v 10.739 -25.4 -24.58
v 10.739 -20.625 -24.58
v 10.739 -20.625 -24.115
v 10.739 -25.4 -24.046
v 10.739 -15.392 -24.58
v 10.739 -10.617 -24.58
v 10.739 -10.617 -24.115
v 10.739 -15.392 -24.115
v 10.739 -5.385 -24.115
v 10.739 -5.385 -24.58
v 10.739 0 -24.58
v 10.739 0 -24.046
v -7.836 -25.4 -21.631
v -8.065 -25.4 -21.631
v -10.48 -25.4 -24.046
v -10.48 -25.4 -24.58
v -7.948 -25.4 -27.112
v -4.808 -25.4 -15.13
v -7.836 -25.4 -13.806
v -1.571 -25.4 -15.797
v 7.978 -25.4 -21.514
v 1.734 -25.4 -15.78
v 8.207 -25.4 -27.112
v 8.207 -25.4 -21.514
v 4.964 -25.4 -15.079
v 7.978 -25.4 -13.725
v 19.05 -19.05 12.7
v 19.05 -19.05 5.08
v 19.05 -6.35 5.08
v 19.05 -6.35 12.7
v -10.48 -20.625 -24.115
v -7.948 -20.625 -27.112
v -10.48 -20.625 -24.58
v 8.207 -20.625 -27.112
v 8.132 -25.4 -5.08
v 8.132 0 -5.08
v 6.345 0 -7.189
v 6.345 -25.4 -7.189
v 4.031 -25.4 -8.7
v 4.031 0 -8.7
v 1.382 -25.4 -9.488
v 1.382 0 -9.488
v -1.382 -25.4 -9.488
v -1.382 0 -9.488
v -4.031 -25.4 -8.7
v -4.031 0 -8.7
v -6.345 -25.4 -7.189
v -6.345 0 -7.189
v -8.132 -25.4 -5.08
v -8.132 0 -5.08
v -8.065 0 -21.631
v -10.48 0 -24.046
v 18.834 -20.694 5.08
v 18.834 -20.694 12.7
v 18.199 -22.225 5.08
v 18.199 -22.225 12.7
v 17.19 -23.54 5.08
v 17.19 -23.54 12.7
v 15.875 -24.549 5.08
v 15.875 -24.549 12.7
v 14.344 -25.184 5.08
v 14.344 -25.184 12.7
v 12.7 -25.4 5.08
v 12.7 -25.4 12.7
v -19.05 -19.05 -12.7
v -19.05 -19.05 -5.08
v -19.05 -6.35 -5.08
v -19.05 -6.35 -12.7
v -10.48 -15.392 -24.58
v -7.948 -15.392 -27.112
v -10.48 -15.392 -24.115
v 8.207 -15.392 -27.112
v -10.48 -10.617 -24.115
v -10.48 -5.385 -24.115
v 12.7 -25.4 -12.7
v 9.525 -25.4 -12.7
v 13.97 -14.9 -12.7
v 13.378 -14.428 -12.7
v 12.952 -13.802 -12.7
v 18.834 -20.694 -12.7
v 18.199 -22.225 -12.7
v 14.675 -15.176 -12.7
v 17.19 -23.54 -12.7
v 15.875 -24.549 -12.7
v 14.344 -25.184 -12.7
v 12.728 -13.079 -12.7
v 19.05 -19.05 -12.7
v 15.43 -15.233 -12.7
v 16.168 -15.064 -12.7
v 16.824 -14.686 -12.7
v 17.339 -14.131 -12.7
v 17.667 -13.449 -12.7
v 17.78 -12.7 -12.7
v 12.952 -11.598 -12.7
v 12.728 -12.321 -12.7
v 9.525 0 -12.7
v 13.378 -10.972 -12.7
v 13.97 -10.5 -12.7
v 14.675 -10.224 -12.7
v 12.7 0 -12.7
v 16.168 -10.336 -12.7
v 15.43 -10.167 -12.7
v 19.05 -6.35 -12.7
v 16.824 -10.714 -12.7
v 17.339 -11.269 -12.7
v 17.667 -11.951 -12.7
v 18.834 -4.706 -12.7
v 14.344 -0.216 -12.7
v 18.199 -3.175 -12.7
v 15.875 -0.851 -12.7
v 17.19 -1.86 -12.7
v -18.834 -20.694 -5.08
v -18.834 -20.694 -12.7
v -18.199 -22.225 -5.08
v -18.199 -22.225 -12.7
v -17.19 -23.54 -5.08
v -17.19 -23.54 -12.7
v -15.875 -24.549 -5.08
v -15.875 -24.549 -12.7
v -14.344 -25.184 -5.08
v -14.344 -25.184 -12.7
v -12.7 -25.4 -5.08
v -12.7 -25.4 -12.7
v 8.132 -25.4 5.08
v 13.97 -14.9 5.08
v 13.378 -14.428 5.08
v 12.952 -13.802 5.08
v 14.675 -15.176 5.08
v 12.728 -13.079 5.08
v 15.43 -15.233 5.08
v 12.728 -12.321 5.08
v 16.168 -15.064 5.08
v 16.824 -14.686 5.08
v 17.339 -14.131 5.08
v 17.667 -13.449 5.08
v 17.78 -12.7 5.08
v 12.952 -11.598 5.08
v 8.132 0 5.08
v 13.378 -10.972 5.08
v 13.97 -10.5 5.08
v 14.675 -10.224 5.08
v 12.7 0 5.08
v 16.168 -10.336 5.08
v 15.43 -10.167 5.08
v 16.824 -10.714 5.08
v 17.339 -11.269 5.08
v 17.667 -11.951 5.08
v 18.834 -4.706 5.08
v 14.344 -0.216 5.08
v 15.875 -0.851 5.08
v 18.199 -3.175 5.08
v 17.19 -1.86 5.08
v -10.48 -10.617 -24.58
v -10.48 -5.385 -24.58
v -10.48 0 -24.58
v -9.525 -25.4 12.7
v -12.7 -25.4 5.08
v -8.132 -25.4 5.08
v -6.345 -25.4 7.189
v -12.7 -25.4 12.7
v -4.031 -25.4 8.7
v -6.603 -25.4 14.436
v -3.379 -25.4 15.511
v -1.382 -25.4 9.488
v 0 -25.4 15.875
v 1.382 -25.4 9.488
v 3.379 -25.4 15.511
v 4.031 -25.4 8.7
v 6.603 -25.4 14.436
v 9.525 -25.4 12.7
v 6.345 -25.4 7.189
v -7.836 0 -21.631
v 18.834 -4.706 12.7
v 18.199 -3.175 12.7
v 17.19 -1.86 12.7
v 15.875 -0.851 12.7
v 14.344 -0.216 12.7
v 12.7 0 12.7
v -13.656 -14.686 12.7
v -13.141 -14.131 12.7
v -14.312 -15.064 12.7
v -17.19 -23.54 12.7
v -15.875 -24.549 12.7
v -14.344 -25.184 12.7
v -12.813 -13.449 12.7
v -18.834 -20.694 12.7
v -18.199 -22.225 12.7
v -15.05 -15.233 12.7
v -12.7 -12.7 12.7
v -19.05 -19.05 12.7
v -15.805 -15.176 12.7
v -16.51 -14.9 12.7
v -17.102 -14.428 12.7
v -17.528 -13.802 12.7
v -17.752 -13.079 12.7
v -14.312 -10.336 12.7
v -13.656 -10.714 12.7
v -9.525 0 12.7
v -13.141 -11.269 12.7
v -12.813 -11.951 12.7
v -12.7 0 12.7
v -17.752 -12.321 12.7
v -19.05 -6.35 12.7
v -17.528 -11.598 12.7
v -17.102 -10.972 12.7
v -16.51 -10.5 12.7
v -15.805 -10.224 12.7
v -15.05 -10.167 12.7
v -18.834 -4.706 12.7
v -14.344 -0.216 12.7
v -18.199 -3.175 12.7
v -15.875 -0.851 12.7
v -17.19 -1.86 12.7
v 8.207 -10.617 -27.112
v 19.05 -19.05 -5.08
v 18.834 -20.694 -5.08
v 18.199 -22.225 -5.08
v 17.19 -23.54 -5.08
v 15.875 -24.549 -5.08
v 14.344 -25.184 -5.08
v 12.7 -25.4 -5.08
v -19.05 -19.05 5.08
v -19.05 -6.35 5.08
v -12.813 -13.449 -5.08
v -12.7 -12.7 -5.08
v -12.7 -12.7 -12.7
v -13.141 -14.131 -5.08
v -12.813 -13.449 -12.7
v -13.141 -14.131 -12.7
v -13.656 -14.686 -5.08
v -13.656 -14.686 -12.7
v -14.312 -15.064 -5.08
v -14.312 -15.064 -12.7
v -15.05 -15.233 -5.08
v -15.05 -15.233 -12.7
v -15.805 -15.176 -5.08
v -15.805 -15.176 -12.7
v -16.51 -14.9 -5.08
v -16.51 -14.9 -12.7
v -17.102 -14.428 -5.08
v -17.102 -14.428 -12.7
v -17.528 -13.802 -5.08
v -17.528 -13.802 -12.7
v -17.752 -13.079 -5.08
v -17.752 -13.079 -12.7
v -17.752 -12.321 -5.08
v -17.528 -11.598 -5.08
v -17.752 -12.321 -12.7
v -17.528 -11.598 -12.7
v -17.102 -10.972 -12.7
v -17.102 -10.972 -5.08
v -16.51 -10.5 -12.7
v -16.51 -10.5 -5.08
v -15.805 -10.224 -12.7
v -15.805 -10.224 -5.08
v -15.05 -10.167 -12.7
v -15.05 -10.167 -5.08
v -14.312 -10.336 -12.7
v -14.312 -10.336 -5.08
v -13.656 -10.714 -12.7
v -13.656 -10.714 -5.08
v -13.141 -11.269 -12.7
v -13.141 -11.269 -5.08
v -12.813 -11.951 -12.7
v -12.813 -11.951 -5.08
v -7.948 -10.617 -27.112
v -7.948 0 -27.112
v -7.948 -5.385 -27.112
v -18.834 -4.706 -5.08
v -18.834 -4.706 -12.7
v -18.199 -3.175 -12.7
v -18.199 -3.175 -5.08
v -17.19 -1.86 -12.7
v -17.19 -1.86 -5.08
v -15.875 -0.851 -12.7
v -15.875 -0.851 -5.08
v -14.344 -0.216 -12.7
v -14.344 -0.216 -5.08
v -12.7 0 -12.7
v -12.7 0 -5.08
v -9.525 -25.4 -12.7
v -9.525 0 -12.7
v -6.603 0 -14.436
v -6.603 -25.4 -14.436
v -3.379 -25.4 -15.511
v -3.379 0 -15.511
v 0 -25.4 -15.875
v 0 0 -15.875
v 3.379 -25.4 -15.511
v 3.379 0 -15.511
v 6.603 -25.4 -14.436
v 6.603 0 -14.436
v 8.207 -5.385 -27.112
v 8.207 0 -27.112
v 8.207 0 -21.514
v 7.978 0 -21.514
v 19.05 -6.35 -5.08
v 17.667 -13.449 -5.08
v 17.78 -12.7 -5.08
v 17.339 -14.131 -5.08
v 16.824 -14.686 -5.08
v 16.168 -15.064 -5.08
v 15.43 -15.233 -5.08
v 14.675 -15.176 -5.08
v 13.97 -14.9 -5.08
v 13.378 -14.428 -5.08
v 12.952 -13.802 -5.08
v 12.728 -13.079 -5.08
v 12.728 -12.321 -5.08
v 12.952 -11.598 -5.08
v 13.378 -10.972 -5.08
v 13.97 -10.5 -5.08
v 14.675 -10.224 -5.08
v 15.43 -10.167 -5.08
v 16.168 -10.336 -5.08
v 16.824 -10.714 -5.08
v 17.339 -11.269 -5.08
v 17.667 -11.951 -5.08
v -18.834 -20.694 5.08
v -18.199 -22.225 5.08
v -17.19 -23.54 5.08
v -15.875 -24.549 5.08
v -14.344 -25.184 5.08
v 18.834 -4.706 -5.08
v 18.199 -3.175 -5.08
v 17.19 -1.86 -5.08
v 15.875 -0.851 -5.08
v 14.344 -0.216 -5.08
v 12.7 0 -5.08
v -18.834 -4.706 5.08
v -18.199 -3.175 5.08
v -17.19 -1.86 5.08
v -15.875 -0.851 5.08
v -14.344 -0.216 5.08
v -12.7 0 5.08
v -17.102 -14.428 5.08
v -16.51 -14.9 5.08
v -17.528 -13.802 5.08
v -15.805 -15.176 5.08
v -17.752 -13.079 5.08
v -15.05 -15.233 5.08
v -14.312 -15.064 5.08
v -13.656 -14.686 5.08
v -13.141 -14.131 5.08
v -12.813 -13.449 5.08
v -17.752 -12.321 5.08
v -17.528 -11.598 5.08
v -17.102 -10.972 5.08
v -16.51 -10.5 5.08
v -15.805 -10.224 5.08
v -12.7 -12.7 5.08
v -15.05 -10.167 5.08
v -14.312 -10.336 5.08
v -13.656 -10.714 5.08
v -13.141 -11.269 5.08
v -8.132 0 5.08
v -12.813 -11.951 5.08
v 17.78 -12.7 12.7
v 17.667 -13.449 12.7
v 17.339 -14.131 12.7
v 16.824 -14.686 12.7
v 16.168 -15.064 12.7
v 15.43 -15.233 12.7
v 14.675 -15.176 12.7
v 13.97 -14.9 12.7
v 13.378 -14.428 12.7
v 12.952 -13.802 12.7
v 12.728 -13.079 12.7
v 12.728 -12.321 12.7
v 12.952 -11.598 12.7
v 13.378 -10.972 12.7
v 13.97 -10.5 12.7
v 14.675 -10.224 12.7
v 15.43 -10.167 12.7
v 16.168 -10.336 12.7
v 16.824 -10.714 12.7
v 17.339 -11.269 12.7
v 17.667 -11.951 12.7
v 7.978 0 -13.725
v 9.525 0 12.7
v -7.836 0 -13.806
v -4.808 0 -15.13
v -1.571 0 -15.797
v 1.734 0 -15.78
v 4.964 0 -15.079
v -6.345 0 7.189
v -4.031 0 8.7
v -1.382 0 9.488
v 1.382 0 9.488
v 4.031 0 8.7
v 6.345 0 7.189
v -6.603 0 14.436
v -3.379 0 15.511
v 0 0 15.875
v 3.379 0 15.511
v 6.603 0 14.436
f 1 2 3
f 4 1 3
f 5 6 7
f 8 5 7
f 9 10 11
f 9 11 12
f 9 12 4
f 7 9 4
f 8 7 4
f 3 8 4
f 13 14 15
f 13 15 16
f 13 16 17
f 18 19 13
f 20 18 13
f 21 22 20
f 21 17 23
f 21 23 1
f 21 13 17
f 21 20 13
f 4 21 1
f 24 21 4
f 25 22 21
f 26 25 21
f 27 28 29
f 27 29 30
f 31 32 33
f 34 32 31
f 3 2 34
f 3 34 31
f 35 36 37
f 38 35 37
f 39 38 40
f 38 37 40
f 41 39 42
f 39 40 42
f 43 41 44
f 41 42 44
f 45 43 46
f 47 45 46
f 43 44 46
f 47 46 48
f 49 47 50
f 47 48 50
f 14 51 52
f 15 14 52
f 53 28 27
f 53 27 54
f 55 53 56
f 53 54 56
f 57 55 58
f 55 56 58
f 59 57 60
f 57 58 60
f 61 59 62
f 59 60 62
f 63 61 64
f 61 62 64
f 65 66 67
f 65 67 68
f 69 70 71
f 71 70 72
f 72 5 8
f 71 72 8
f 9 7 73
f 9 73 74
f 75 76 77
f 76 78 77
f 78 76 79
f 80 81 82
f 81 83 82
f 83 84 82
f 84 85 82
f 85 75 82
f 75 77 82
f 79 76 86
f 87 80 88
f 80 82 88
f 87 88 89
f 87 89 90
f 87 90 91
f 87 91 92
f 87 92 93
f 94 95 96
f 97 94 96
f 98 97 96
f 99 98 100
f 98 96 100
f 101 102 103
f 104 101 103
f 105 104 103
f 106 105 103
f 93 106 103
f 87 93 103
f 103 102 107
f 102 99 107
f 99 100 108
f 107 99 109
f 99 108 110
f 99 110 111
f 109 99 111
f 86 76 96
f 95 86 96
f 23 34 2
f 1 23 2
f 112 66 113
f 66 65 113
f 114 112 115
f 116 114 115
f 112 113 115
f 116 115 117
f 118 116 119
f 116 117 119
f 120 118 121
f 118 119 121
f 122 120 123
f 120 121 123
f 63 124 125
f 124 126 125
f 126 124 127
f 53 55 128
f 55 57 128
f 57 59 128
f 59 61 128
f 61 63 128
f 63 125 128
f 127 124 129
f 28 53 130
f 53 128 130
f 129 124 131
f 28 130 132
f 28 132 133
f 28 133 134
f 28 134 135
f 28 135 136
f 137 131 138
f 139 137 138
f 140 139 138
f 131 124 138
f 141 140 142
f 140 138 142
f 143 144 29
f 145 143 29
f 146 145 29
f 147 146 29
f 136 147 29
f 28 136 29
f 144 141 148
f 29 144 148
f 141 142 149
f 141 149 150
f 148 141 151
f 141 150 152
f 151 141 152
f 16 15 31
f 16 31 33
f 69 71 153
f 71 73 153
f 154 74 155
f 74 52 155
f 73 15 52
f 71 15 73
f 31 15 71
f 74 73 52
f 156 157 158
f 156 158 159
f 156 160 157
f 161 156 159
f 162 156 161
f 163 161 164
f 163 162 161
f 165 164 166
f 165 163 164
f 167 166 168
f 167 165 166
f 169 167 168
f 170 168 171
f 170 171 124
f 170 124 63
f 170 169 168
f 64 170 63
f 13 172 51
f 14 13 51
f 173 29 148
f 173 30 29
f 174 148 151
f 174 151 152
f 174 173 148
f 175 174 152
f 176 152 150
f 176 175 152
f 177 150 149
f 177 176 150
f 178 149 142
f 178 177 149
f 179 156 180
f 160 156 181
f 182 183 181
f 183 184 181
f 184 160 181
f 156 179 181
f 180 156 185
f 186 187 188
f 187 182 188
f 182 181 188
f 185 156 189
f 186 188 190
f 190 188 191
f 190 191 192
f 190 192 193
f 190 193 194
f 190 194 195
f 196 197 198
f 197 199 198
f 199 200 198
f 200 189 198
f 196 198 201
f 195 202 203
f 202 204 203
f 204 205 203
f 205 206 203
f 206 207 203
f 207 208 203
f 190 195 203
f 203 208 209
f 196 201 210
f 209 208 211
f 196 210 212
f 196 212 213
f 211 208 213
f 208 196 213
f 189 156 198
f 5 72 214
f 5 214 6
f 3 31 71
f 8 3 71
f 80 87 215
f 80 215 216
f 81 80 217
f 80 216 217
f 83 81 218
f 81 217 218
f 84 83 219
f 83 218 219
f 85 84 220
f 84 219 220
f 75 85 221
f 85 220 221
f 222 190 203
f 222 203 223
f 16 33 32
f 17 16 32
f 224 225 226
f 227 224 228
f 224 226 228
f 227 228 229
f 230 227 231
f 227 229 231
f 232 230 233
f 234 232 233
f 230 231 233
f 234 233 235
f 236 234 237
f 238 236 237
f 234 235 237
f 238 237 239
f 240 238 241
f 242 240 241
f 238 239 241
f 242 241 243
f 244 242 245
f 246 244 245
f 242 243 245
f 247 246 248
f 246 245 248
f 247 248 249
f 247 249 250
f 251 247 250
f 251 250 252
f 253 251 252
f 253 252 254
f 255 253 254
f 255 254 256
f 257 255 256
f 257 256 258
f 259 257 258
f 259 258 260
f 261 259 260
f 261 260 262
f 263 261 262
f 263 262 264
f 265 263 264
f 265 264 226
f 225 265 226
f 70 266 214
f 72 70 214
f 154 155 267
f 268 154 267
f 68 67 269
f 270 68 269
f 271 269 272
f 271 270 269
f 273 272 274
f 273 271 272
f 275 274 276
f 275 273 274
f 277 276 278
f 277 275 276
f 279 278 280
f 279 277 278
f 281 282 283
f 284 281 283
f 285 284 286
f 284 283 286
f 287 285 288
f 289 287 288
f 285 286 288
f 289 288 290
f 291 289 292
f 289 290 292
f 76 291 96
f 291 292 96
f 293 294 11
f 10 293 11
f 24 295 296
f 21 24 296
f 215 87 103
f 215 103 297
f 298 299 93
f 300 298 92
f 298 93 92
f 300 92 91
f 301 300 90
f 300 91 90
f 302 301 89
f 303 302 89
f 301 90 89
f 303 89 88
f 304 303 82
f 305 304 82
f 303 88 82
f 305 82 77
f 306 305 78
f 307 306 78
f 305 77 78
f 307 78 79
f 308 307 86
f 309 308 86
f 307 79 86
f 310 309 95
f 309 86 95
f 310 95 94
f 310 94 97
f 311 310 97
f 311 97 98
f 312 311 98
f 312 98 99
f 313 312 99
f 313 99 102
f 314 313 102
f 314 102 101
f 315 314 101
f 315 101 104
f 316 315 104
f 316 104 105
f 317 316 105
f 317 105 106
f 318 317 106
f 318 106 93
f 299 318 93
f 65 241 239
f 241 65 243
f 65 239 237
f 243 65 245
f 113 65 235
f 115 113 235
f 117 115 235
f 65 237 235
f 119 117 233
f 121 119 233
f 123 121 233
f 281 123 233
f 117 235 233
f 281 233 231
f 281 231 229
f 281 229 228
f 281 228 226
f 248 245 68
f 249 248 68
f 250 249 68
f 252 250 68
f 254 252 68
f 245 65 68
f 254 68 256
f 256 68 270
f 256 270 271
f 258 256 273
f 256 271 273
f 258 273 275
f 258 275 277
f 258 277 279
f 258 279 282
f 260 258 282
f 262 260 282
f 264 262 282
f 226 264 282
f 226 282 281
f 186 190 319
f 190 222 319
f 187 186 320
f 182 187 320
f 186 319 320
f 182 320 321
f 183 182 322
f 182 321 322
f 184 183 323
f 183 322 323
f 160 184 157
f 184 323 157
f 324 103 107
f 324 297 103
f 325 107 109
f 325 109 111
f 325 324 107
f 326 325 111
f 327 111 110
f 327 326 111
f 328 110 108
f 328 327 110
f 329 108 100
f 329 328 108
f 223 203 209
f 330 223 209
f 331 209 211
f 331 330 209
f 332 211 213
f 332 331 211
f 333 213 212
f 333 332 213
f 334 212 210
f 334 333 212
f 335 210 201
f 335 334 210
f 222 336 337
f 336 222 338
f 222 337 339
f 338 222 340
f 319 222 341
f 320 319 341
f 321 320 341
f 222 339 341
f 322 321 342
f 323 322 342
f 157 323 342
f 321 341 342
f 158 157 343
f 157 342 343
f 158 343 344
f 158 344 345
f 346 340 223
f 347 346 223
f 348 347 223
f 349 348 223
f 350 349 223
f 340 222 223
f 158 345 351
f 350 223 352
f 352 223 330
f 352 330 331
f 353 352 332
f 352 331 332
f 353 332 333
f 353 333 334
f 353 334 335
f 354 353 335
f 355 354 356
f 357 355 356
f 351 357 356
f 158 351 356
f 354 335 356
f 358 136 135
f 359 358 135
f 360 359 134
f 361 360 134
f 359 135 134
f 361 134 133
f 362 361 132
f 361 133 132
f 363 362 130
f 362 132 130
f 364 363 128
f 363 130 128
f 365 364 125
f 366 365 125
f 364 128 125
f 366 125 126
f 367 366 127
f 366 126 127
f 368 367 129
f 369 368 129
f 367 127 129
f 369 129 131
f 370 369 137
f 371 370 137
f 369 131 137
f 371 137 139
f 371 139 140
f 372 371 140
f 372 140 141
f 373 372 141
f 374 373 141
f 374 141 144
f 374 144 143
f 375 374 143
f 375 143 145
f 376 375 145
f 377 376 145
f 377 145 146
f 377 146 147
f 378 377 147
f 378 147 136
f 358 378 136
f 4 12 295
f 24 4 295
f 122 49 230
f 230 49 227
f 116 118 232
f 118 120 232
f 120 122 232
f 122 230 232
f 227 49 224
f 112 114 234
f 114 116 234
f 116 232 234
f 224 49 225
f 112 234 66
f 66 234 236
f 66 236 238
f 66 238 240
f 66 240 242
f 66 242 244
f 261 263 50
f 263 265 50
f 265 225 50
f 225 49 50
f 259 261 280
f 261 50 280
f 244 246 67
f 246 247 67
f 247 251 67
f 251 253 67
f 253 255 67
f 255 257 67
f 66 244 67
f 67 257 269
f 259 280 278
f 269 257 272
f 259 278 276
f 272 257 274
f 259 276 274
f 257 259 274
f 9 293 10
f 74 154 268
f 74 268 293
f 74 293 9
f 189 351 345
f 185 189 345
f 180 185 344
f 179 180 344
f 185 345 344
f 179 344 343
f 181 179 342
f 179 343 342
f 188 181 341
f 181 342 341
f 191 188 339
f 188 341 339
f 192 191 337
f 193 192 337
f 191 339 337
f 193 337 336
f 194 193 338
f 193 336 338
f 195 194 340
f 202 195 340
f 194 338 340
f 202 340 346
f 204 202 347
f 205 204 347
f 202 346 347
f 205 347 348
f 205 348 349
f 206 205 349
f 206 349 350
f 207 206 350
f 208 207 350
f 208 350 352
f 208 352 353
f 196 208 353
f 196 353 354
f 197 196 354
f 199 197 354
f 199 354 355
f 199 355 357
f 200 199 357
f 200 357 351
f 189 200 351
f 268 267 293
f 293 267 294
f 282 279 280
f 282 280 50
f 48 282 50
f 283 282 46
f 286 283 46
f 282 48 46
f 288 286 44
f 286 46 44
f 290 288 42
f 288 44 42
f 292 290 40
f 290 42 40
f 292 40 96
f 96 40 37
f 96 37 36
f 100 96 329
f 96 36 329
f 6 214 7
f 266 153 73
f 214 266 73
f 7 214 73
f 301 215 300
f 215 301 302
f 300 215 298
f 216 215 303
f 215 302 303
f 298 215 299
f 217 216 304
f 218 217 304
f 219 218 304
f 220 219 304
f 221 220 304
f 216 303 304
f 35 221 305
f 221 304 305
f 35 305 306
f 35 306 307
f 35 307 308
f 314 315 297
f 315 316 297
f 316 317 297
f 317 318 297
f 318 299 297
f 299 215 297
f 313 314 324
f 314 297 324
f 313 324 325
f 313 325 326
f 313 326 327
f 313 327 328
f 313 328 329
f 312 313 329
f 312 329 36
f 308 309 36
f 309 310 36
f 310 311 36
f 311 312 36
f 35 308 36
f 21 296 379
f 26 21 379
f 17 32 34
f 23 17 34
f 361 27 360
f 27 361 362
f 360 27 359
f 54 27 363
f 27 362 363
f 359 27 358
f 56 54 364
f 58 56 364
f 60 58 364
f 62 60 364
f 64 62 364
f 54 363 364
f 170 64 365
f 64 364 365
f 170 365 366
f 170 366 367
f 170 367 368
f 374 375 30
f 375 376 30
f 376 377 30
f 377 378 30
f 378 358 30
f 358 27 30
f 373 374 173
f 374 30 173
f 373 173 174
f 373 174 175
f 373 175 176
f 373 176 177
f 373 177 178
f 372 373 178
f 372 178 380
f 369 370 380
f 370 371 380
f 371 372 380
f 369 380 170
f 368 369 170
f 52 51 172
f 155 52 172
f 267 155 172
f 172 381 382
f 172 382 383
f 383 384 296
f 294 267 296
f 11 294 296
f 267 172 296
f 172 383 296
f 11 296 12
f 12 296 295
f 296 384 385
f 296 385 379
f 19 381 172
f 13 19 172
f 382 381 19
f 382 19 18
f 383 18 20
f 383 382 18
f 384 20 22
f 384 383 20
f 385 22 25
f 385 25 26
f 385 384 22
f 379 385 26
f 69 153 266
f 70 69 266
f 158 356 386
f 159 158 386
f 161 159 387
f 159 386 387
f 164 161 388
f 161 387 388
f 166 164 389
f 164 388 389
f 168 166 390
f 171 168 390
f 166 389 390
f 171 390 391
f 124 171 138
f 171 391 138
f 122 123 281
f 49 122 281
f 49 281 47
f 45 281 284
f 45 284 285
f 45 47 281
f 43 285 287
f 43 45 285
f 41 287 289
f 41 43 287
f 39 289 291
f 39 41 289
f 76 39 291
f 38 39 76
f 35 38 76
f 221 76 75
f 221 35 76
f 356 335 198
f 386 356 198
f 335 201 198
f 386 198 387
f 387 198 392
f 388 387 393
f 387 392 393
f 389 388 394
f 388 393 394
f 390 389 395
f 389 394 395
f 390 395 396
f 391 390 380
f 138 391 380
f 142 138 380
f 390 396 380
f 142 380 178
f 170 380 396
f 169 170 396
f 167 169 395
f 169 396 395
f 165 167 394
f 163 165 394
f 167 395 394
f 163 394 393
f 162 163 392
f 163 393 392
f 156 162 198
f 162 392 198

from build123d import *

# Parameters (mm, degrees)
F1_DEPTH = 25.4
F3_DEPTH = 25.4
F4_W     = 5.2324
F4_H     = 18.784354
F4_H_2   = 16.00518
F5_DEPTH = 12.7
F7_R     = 6.35
F8_R     = 2.54
F9_DEPTH = 38.1


with BuildPart() as f1:
    # F0 (on Front) → F1 (new body)
    with BuildSketch(Plane.XZ):
        with BuildLine():
            Line((-19.05, 12.7), (-19.05, 5.08))
            Line((-19.05, 5.08), (-8.132216, 5.08))
            ThreePointArc((-8.132216, 5.08), (0, 9.5885), (8.132216, 5.08))
            Line((8.132216, 5.08), (19.05, 5.08))
            Line((19.05, 5.08), (19.05, 12.7))
            Line((19.05, 12.7), (9.525, 12.7))
            ThreePointArc((9.525, 12.7), (0, 15.875), (-9.525, 12.7))
            Line((-9.525, 12.7), (-19.05, 12.7))
        make_face()
        with BuildLine():
            ThreePointArc((8.132216, -5.08), (0, -9.5885), (-8.132216, -5.08))
            Line((-8.132216, -5.08), (-19.05, -5.08))
            Line((-19.05, -5.08), (-19.05, -12.7))
            Line((-19.05, -12.7), (-9.525, -12.7))
            ThreePointArc((-9.525, -12.7), (0, -15.875), (9.525, -12.7))
            Line((9.525, -12.7), (19.05, -12.7))
            Line((19.05, -12.7), (19.05, -5.08))
            Line((19.05, -5.08), (8.132216, -5.08))
        make_face()
    extrude(amount=F1_DEPTH)

    # F7
    f7_edges = [f1.edges().sort_by_distance(p)[0] for p in [
        (-19.05, 0, -8.89),
        (-19.05, 0, 8.89),
        (-19.05, -25.4, 8.89),
        (-19.05, -25.4, -8.89),
        (19.05, -25.4, -8.89),
        (19.05, -25.4, 8.89),
        (19.05, 0, -8.89),
        (19.05, 0, 8.89),
    ]]
    fillet(f7_edges, radius=F7_R)

    # F8 (on face) → F9 (cut)
    with BuildSketch(Plane(origin=(0, 0, -12.7), x_dir=(1, 0, 0), z_dir=(0, 0, -1))):
        with Locations((-15.24, 12.7)):
            Circle(F8_R)
        with Locations((15.24, 12.7)):
            Circle(F8_R)
    extrude(amount=-F9_DEPTH, mode=Mode.SUBTRACT)


with BuildPart() as f3:
    # F2 (on Front) → F3 (new body)
    with BuildSketch(Plane.XZ):
        Polygon((7.978181, -12.7), (-7.8359, -12.7), (-7.8359, -21.630681), (-8.0645, -21.630681), (-10.480051, -24.046232), (-10.480051, -24.579632), (-7.947619, -27.112064), (8.206781, -27.112064), (10.739213, -24.579632), (10.739213, -24.046232), (8.206781, -21.5138), (7.978181, -21.5138), align=None)
    extrude(amount=F3_DEPTH)

    # F4 (on Right) → F5 (cut, symmetric)
    with BuildSketch(Plane.YZ):
        with Locations((-8.001, -33.507041)):
            Rectangle(F4_W, F4_H)
        with Locations((-18.0086, -32.117454)):
            Rectangle(F4_W, F4_H_2)
    extrude(amount=F5_DEPTH, both=True, mode=Mode.SUBTRACT)

    # F6: cut F1
    add(f1.part, mode=Mode.SUBTRACT)


solid = Compound([f1.part, f3.part])
